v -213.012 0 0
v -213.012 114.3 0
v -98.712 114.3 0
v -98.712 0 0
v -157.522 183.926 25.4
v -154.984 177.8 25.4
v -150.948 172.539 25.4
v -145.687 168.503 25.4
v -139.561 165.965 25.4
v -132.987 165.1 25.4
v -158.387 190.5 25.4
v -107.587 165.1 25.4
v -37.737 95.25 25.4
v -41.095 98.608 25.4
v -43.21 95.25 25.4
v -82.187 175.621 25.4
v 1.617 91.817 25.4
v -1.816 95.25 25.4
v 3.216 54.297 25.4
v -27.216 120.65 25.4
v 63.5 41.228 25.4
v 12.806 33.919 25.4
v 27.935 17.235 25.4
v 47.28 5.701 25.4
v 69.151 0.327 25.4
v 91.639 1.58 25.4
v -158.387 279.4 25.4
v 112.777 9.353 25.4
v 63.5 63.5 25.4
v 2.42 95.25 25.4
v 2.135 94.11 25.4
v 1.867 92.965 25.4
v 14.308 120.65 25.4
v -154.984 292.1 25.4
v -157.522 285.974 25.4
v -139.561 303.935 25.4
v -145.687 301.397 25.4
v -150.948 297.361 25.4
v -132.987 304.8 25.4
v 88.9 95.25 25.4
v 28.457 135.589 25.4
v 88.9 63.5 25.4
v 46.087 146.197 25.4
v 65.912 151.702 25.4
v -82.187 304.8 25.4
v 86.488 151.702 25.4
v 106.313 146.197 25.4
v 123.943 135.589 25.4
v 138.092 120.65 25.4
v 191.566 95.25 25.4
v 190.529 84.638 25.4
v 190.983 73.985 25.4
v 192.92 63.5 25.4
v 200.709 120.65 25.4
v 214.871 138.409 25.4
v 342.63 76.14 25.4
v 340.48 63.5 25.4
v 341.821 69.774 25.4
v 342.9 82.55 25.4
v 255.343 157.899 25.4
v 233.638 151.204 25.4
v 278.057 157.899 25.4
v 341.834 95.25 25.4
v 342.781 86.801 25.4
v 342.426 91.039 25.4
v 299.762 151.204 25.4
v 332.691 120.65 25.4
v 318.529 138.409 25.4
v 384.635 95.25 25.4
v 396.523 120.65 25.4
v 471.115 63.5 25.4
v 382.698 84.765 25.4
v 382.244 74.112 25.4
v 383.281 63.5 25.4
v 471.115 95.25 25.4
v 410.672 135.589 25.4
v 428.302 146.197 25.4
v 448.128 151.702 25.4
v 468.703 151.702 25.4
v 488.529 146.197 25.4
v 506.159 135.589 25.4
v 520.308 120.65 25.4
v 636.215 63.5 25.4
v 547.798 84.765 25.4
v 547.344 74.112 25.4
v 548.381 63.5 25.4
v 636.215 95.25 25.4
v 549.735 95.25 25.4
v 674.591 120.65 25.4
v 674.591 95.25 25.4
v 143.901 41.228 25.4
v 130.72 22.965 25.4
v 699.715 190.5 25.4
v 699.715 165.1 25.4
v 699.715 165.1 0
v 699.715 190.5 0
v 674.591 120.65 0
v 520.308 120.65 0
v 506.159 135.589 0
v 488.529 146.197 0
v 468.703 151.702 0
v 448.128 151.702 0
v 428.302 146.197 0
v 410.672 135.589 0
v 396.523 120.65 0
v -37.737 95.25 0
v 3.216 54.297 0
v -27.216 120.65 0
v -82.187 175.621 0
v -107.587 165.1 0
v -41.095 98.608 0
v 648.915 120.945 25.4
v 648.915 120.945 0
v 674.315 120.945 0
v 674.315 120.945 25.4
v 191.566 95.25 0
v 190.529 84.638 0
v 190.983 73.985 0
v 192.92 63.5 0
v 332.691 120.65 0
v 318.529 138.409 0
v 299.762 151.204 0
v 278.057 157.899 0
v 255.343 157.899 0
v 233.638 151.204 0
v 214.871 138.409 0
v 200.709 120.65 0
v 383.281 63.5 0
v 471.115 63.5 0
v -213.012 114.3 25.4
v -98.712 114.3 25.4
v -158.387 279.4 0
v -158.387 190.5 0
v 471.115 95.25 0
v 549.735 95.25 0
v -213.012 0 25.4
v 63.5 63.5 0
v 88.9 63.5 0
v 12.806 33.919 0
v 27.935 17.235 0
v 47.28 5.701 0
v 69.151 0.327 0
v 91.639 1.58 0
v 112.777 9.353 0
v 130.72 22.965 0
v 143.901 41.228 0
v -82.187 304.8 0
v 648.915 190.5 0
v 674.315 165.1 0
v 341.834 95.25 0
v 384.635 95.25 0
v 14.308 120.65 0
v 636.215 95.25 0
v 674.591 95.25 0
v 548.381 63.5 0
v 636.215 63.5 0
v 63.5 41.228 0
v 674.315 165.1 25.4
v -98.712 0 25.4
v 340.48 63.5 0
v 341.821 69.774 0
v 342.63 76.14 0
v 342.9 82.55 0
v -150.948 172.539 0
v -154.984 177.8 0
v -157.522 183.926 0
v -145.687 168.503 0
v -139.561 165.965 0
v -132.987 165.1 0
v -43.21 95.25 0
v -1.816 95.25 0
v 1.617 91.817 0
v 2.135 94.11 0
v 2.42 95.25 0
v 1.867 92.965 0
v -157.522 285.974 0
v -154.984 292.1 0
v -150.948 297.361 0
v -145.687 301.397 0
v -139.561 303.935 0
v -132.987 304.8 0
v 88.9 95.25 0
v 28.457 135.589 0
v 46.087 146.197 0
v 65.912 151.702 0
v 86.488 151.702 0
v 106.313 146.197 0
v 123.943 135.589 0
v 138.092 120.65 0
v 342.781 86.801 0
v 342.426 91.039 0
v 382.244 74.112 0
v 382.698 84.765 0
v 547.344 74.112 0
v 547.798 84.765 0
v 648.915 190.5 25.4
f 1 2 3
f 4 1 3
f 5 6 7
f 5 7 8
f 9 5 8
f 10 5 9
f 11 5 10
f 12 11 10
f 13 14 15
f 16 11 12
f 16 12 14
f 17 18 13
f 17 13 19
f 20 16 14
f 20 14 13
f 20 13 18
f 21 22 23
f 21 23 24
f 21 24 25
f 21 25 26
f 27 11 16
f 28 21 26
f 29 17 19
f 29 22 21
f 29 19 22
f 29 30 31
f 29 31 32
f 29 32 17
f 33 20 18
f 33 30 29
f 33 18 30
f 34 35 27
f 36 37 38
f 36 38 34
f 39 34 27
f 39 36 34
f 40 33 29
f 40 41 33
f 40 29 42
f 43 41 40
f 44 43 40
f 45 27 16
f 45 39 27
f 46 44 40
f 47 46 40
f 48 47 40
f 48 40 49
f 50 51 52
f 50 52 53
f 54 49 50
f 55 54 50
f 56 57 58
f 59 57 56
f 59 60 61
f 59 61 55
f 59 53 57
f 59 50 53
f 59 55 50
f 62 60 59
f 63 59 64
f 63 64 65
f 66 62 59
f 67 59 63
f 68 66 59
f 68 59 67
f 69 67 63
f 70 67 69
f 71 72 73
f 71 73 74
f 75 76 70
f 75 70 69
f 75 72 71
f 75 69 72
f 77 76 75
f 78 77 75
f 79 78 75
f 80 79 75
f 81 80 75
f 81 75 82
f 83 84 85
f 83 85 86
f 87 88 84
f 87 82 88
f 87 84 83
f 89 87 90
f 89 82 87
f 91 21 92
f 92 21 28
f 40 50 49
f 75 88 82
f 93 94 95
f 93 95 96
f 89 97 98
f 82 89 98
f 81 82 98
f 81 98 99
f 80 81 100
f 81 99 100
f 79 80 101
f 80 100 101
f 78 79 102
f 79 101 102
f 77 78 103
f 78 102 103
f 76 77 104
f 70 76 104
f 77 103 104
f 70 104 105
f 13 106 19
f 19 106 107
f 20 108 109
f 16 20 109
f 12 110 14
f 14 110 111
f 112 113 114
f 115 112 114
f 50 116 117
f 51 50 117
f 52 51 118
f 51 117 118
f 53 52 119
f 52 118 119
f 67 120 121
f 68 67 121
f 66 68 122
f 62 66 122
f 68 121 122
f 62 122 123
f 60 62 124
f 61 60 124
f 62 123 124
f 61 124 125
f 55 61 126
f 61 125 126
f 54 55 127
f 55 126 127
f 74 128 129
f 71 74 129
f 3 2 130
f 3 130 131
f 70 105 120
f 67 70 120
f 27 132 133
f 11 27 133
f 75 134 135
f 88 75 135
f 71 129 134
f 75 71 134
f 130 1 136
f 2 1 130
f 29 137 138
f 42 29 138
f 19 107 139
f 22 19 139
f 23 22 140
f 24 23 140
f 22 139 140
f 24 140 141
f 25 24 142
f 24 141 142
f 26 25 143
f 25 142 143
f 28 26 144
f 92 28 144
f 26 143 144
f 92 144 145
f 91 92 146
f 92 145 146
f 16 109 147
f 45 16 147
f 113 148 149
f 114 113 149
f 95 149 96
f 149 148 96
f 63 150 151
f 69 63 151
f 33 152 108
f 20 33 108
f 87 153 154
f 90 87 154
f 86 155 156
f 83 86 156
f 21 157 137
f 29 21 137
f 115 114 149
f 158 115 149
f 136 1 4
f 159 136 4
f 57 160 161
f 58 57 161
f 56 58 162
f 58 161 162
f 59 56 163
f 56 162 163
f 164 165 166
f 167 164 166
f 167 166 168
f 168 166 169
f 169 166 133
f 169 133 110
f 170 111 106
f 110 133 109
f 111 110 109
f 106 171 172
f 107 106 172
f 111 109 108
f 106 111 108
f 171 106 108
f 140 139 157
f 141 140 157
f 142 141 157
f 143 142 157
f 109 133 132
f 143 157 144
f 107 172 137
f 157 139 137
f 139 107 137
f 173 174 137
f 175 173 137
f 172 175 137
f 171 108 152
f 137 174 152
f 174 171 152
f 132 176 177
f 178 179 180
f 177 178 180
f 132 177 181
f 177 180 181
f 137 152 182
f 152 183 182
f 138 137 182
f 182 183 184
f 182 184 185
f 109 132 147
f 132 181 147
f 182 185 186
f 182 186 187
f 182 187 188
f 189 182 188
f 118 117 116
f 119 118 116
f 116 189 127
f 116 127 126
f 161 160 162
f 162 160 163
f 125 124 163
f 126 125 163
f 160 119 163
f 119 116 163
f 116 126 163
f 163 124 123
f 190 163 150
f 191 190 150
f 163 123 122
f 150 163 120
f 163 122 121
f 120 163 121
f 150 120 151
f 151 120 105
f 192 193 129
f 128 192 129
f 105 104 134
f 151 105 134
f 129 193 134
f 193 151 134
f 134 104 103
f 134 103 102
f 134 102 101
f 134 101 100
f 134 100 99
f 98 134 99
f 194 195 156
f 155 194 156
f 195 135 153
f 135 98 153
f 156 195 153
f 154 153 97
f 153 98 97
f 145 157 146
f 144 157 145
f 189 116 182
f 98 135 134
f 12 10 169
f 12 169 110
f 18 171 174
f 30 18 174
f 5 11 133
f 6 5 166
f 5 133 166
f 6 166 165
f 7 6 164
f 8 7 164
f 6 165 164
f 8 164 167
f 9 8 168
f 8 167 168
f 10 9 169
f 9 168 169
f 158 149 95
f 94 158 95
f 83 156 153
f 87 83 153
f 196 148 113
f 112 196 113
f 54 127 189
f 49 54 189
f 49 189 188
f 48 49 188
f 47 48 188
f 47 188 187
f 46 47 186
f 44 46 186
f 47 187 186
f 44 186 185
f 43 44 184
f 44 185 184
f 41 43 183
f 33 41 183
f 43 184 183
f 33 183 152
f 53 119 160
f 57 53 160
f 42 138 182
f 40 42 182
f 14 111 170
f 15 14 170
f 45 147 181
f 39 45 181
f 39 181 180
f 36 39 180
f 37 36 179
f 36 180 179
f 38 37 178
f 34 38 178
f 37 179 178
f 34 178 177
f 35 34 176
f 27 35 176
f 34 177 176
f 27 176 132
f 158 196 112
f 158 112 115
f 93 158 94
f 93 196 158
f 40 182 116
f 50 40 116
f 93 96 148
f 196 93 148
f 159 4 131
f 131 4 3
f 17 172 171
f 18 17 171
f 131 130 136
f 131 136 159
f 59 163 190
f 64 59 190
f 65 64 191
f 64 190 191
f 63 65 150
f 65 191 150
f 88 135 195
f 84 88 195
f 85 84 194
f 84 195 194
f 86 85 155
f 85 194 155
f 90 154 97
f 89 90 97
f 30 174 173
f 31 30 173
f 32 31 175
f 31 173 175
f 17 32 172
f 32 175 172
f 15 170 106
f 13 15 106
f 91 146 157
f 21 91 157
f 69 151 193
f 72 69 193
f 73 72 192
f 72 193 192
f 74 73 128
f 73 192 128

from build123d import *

# Parameters (mm, degrees)
F0_W     = 114.3
F0_H     = 114.3
F1_DEPTH = 25.4
F0_W_2   = 25.4
F0_H_2   = 25.4
F0_H_3   = 6.35


with BuildPart() as f1:
    # F0 (on Top) → F1 (new body)
    with BuildSketch(Plane.XY):
        with Locations((-155.8617118359, 57.15)):
            Rectangle(F0_W, F0_H)
    extrude(amount=F1_DEPTH)


with BuildPart() as f1b:
    # F0 (on Top) → F1, piece 2 (new body)
    with BuildSketch(Plane.XY):
        with BuildLine():
            ThreePointArc((549.7351123646, 95.25), (547.3846292276, 79.4463630577), (548.3812318645, 63.5))
            Line((548.3812318645, 63.5), (610.8154451098, 63.5))
            Line((610.8154451098, 63.5), (610.8154451098, 88.9))
            Line((610.8154451098, 88.9), (610.8154451098, 95.25))
            Line((610.8154451098, 95.25), (549.7351123646, 95.25))
        make_face()
        with BuildLine():
            ThreePointArc((384.6351123646, 95.25), (382.2846292276, 79.4463630577), (383.2812318645, 63.5))
            Line((383.2812318645, 63.5), (445.7154451098, 63.5))
            Line((445.7154451098, 63.5), (445.7154451098, 88.9))
            Line((445.7154451098, 88.9), (445.7154451098, 95.25))
            Line((445.7154451098, 95.25), (384.6351123646, 95.25))
        make_face()
        with BuildLine():
            ThreePointArc((2.4196672547, 95.25), (1.9986775513, 93.5379279863), (1.6174108262, 91.8165742762))
            ThreePointArc((1.6174108262, 91.8165742762), (0.0690439068, 72.956926715), (3.2156808044, 54.2972798137))
            ThreePointArc((3.2156808044, 54.2972798137), (69.1514990582, 0.3266935314), (143.9007431471, 41.22787714))
            Line((143.9007431471, 41.22787714), (63.5, 41.22787714))
            Line((63.5, 41.22787714), (63.5, 63.5))
            Line((63.5, 63.5), (63.5, 88.9))
            Line((63.5, 88.9), (63.5, 95.25))
            Line((63.5, 95.25), (2.4196672547, 95.25))
        make_face()
        Polygon((-107.5870393819, 165.1), (-41.0950939232, 98.6080545413), (-27.2160148976, 120.65), (-38.3374551225, 131.7714402249), (-40.5287286181, 133.9627137205), (-54.8269536405, 148.2609387429), (-60.6505539628, 154.0845390652), (-71.6660148976, 165.1), (-82.1870393819, 175.6210244843), (-82.1870393819, 304.8), (-107.5870393819, 304.8), align=None)
        with BuildLine():
            Line((332.6911357684, 120.65), (200.7088642316, 120.65))
            ThreePointArc((200.7088642316, 120.65), (195.0035493657, 108.3581182274), (191.5657867546, 95.25))
            Line((191.5657867546, 95.25), (254, 95.25))
            Line((254, 95.25), (279.4, 95.25))
            Line((279.4, 95.25), (341.8342132454, 95.25))
            ThreePointArc((341.8342132454, 95.25), (338.3964506343, 108.3581182274), (332.6911357684, 120.65))
        make_face()
        with BuildLine():
            Line((674.5907105505, 120.65), (561.6233010203, 120.65))
            ThreePointArc((561.6233010203, 120.65), (554.5006261025, 108.5016215905), (549.7351123646, 95.25))
            Line((549.7351123646, 95.25), (610.8154451098, 95.25))
            Line((610.8154451098, 95.25), (636.2154451098, 95.25))
            Line((636.2154451098, 95.25), (674.5907105505, 95.25))
            Line((674.5907105505, 95.25), (674.5907105505, 120.65))
        make_face()
        with BuildLine():
            ThreePointArc((191.5657867546, 95.25), (190.5691841177, 79.3036369423), (192.9196672547, 63.5))
            Line((192.9196672547, 63.5), (340.4803327453, 63.5))
            ThreePointArc((340.4803327453, 63.5), (342.2926628556, 72.9484729128), (342.9, 82.55))
            ThreePointArc((342.9, 82.55), (342.6330858365, 88.9223210333), (341.8342132454, 95.25))
            Line((341.8342132454, 95.25), (279.4, 95.25))
            Line((279.4, 95.25), (279.4, 69.85))
            Line((279.4, 69.85), (254, 69.85))
            Line((254, 69.85), (254, 95.25))
            Line((254, 95.25), (191.5657867546, 95.25))
        make_face()
        with BuildLine():
            Line((396.5233010203, 120.65), (332.6911357684, 120.65))
            ThreePointArc((332.6911357684, 120.65), (338.3964506343, 108.3581182274), (341.8342132454, 95.25))
            Line((341.8342132454, 95.25), (384.6351123646, 95.25))
            ThreePointArc((384.6351123646, 95.25), (389.4006261025, 108.5016215905), (396.5233010203, 120.65))
        make_face()
        with BuildLine():
            Line((561.6233010203, 120.65), (520.3075891994, 120.65))
            ThreePointArc((520.3075891994, 120.65), (527.4302641172, 108.5016215905), (532.1957778551, 95.25))
            Line((532.1957778551, 95.25), (549.7351123646, 95.25))
            ThreePointArc((549.7351123646, 95.25), (554.5006261025, 108.5016215905), (561.6233010203, 120.65))
        make_face()
        with BuildLine():
            Line((-132.9870393819, 165.1), (-107.5870393819, 165.1))
            Line((-107.5870393819, 165.1), (-107.5870393819, 304.8))
            Line((-107.5870393819, 304.8), (-132.9870393819, 304.8))
            ThreePointArc((-132.9870393819, 304.8), (-150.947551624, 297.3605122421), (-158.3870393819, 279.4))
            Line((-158.3870393819, 279.4), (-158.3870393819, 190.5))
            ThreePointArc((-158.3870393819, 190.5), (-150.947551624, 172.5394877579), (-132.9870393819, 165.1))
        make_face()
        with BuildLine():
            Line((200.7088642316, 120.65), (138.0921440895, 120.65))
            ThreePointArc((138.0921440895, 120.65), (145.2148190074, 108.5016215905), (149.9803327453, 95.25))
            Line((149.9803327453, 95.25), (191.5657867546, 95.25))
            ThreePointArc((191.5657867546, 95.25), (195.0035493657, 108.3581182274), (200.7088642316, 120.65))
        make_face()
        with BuildLine():
            ThreePointArc((14.3078559105, 120.65), (7.1851809926, 108.5016215905), (2.4196672547, 95.25))
            Line((2.4196672547, 95.25), (63.5, 95.25))
            Line((63.5, 95.25), (88.9, 95.25))
            Line((88.9, 95.25), (149.9803327453, 95.25))
            ThreePointArc((149.9803327453, 95.25), (145.2148190074, 108.5016215905), (138.0921440895, 120.65))
            Line((138.0921440895, 120.65), (14.3078559105, 120.65))
        make_face()
        with BuildLine():
            ThreePointArc((332.6911357684, 120.65), (266.7, 158.75), (200.7088642316, 120.65))
            Line((200.7088642316, 120.65), (332.6911357684, 120.65))
        make_face()
        with BuildLine():
            ThreePointArc((520.3075891994, 120.65), (458.4154451098, 152.4), (396.5233010203, 120.65))
            Line((396.5233010203, 120.65), (520.3075891994, 120.65))
        make_face()
        with BuildLine():
            ThreePointArc((138.0921440895, 120.65), (76.2, 152.4), (14.3078559105, 120.65))
            Line((14.3078559105, 120.65), (138.0921440895, 120.65))
        make_face()
        with BuildLine():
            Line((520.3075891994, 120.65), (396.5233010203, 120.65))
            ThreePointArc((396.5233010203, 120.65), (389.4006261025, 108.5016215905), (384.6351123646, 95.25))
            Line((384.6351123646, 95.25), (445.7154451098, 95.25))
            Line((445.7154451098, 95.25), (471.1154451098, 95.25))
            Line((471.1154451098, 95.25), (532.1957778551, 95.25))
            ThreePointArc((532.1957778551, 95.25), (527.4302641172, 108.5016215905), (520.3075891994, 120.65))
        make_face()
        with BuildLine():
            Line((-1.8160148976, 95.25), (2.4196672547, 95.25))
            ThreePointArc((2.4196672547, 95.25), (7.1851809926, 108.5016215905), (14.3078559105, 120.65))
            Line((14.3078559105, 120.65), (-27.2160148976, 120.65))
            Line((-27.2160148976, 120.65), (-41.0950939232, 98.6080545413))
            Line((-41.0950939232, 98.6080545413), (-37.7370393819, 95.25))
            Line((-37.7370393819, 95.25), (-1.8160148976, 95.25))
        make_face()
        with BuildLine():
            ThreePointArc((3.2156808044, 54.2972798137), (0.0690439068, 72.956926715), (1.6174108262, 91.8165742762))
            Line((1.6174108262, 91.8165742762), (-1.8160148976, 95.25))
            Line((-1.8160148976, 95.25), (-37.7370393819, 95.25))
            Line((-37.7370393819, 95.25), (3.2156808044, 54.2972798137))
        make_face()
        Polygon((-43.2095490396, 95.25), (-37.7370393819, 95.25), (-41.0950939232, 98.6080545413), align=None)
        with Locations((266.7, 82.55)):
            Rectangle(F0_W_2, F0_H_2)
        with Locations((76.2, 76.2)):
            Rectangle(F0_W_2, F0_H_2)
        with Locations((458.4154451098, 76.2)):
            Rectangle(F0_W_2, F0_H_2)
        with Locations((458.4154451098, 92.075)):
            Rectangle(F0_W_2, F0_H_3)
        with Locations((623.5154451098, 76.2)):
            Rectangle(F0_W_2, F0_H_2)
        with Locations((76.2, 92.075)):
            Rectangle(F0_W_2, F0_H_3)
        with Locations((623.5154451098, 92.075)):
            Rectangle(F0_W_2, F0_H_3)
    extrude(amount=F1_DEPTH)


with BuildPart() as f1c:
    # F0 (on Top) → F1, piece 3 (new body)
    with BuildSketch(Plane.XY):
        with BuildLine():
            ThreePointArc((648.9154451098, 148.0420489686), (662.3510594962, 141.7609262841), (674.3154451098, 132.9961266285))
            Line((674.3154451098, 132.9961266285), (674.3154451098, 165.1))
            Line((674.3154451098, 165.1), (674.3154451098, 190.5))
            Line((674.3154451098, 190.5), (648.9154451098, 190.5))
            Line((648.9154451098, 190.5), (648.9154451098, 148.0420489686))
        make_face()
        with BuildLine():
            Line((674.3154451098, 120.9446117282), (674.3154451098, 132.9961266285))
            ThreePointArc((674.3154451098, 132.9961266285), (662.3510594962, 141.7609262841), (648.9154451098, 148.0420489686))
            Line((648.9154451098, 148.0420489686), (648.9154451098, 120.9446117282))
            Line((648.9154451098, 120.9446117282), (674.3154451098, 120.9446117282))
        make_face()
        with Locations((687.0154451098, 177.8)):
            Rectangle(F0_W_2, F0_H_2)
    extrude(amount=F1_DEPTH)


solid = Compound([f1.part, f1b.part, f1c.part])
